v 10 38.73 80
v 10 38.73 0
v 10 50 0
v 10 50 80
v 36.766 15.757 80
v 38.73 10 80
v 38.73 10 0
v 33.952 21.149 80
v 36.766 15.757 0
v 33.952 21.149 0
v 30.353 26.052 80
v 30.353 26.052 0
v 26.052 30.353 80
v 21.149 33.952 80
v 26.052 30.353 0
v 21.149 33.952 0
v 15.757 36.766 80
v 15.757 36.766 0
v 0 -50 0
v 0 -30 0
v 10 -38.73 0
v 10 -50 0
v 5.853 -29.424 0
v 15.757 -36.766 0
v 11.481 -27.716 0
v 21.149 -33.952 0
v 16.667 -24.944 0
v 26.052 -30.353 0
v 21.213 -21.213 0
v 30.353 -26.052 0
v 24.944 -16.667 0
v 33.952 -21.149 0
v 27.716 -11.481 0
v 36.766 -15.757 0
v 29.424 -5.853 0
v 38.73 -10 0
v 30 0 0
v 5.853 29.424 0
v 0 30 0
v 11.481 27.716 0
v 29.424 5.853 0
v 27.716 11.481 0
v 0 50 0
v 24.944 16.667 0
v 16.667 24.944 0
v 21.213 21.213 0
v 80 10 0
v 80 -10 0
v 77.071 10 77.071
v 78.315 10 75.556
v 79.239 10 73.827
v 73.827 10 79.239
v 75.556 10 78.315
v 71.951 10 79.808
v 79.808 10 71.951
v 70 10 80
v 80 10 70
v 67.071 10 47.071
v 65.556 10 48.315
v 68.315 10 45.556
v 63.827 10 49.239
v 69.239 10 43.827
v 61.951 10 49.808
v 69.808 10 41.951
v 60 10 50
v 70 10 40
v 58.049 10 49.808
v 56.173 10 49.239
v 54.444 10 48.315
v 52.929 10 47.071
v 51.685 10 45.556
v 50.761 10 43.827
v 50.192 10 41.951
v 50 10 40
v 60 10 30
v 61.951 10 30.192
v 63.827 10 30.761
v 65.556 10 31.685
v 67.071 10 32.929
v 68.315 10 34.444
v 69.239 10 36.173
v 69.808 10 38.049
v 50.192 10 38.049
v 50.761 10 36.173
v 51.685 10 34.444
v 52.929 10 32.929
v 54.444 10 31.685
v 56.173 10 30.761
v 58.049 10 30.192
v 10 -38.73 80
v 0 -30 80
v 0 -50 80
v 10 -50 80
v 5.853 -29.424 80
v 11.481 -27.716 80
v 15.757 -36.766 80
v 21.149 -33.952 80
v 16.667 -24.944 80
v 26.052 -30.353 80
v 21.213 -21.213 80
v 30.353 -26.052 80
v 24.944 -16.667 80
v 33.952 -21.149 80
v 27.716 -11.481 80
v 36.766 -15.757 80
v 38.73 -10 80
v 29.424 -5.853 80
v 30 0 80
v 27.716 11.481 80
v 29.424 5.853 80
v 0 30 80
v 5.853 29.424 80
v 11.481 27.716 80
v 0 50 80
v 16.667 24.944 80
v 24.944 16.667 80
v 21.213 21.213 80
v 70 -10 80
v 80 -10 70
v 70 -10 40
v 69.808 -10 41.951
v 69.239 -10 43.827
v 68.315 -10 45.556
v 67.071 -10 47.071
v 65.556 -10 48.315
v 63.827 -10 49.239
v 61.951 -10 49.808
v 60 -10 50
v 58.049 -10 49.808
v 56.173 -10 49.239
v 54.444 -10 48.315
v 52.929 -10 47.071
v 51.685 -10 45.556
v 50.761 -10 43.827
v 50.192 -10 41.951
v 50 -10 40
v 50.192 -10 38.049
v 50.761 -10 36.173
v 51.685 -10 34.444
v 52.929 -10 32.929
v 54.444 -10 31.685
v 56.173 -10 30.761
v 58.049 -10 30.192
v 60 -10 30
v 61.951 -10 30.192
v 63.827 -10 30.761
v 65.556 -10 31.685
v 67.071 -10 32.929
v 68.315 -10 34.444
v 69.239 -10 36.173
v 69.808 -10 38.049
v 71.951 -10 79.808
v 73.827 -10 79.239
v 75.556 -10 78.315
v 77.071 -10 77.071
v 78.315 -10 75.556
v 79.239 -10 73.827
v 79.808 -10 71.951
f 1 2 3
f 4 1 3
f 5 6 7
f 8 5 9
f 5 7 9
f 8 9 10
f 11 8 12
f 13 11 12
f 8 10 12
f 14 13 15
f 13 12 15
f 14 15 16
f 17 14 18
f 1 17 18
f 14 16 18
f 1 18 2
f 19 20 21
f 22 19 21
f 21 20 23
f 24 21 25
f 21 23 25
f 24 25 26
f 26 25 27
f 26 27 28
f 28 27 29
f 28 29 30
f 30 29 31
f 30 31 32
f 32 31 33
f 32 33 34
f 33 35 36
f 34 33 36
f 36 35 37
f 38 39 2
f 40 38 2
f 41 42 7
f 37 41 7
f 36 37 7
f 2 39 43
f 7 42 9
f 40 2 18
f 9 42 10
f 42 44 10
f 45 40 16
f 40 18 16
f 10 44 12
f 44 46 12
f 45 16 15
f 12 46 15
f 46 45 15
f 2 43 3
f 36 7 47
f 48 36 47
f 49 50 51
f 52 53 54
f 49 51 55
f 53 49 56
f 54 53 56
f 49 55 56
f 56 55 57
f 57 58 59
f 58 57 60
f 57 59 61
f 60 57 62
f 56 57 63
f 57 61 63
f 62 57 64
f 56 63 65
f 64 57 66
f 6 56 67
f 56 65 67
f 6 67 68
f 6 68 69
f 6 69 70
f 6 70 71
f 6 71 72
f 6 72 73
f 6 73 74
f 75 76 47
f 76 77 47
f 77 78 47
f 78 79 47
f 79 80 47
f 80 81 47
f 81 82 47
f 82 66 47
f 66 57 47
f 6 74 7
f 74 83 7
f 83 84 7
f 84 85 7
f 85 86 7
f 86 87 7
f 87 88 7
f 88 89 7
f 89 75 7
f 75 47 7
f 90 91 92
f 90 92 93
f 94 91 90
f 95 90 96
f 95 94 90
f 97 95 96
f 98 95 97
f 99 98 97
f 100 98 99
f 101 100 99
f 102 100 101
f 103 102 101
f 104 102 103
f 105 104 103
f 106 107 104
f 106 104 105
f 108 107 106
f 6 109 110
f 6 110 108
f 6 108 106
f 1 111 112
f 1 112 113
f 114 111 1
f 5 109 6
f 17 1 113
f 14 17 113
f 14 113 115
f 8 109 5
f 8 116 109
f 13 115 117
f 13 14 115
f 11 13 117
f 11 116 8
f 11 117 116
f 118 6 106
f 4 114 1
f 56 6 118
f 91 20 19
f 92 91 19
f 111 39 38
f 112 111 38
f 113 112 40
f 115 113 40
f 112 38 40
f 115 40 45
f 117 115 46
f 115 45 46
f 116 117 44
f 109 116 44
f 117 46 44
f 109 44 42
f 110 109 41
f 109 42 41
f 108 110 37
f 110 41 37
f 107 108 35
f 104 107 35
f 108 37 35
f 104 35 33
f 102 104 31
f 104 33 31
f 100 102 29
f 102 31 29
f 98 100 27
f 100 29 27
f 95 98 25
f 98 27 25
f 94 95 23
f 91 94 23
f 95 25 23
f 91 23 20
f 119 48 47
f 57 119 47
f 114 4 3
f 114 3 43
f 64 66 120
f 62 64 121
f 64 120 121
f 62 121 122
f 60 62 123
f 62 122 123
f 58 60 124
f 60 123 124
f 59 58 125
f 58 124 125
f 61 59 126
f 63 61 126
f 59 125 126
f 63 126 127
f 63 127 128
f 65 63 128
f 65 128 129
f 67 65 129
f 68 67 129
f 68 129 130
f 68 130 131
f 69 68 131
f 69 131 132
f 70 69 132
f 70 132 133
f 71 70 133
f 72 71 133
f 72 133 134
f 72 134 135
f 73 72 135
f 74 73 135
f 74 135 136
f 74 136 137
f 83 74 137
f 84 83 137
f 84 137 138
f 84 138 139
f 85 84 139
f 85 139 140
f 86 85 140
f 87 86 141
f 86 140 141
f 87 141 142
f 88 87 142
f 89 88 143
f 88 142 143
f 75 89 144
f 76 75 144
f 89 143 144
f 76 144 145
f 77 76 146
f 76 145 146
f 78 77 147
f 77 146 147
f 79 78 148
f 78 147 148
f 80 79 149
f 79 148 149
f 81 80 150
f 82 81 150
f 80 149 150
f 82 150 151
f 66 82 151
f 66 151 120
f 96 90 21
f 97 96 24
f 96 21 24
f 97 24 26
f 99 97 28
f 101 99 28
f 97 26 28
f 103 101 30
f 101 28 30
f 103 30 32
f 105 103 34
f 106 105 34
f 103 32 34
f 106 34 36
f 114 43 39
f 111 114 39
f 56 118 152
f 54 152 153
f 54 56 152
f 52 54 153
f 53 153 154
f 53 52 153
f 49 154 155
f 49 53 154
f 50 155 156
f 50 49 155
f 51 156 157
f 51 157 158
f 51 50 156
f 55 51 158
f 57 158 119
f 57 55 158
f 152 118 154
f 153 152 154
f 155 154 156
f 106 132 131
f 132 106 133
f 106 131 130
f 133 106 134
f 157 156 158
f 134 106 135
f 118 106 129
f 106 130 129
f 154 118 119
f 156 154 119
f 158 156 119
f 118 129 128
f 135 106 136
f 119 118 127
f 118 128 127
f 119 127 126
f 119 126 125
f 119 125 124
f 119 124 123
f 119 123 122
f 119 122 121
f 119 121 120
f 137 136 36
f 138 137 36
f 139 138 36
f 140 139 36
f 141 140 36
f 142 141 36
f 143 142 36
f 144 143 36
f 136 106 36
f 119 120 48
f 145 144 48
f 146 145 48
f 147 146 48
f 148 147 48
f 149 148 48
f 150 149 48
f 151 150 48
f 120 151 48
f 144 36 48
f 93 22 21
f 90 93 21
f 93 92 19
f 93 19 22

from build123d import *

# Parameters (mm, degrees)
EXTRUDE_1_DEPTH     = 80
SKETCH_2_R          = 10
CUT_EXTRUDE_1_DEPTH = 129.062484749
FILLET_1_R          = 10


with BuildPart() as part:
    # 草圖1 → 填料-伸長1 (new body)
    with BuildSketch(Plane.XY):
        with BuildLine():
            Line((0, -30), (0, -50))
            Line((0, -50), (10, -50))
            Line((10, -50), (10, -38.729833462))
            ThreePointArc((10, -38.729833462), (28.284271247, -28.284271247), (38.729833462, -10))
            Line((38.729833462, -10), (80, -10))
            Line((80, -10), (80, 10))
            Line((80, 10), (38.729833462, 10))
            ThreePointArc((38.729833462, 10), (28.284271247, 28.284271247), (10, 38.729833462))
            Line((10, 38.729833462), (10, 50))
            Line((10, 50), (0, 50))
            Line((0, 50), (0, 30))
            ThreePointArc((0, 30), (30, 0), (0, -30))
        make_face()
    extrude(amount=EXTRUDE_1_DEPTH)

    # 草圖2 → 除料-伸長1 (cut, through all)
    with BuildSketch(Plane.XZ.offset(10)):
        with Locations((60, 40)):
            Circle(SKETCH_2_R)
    extrude(amount=-CUT_EXTRUDE_1_DEPTH, mode=Mode.SUBTRACT)

    # 圓角1
    fillet_1_edges = [part.edges().sort_by_distance(p)[0] for p in [
        (80, 0, 80),
    ]]
    fillet(fillet_1_edges, radius=FILLET_1_R)


solid = part.part
